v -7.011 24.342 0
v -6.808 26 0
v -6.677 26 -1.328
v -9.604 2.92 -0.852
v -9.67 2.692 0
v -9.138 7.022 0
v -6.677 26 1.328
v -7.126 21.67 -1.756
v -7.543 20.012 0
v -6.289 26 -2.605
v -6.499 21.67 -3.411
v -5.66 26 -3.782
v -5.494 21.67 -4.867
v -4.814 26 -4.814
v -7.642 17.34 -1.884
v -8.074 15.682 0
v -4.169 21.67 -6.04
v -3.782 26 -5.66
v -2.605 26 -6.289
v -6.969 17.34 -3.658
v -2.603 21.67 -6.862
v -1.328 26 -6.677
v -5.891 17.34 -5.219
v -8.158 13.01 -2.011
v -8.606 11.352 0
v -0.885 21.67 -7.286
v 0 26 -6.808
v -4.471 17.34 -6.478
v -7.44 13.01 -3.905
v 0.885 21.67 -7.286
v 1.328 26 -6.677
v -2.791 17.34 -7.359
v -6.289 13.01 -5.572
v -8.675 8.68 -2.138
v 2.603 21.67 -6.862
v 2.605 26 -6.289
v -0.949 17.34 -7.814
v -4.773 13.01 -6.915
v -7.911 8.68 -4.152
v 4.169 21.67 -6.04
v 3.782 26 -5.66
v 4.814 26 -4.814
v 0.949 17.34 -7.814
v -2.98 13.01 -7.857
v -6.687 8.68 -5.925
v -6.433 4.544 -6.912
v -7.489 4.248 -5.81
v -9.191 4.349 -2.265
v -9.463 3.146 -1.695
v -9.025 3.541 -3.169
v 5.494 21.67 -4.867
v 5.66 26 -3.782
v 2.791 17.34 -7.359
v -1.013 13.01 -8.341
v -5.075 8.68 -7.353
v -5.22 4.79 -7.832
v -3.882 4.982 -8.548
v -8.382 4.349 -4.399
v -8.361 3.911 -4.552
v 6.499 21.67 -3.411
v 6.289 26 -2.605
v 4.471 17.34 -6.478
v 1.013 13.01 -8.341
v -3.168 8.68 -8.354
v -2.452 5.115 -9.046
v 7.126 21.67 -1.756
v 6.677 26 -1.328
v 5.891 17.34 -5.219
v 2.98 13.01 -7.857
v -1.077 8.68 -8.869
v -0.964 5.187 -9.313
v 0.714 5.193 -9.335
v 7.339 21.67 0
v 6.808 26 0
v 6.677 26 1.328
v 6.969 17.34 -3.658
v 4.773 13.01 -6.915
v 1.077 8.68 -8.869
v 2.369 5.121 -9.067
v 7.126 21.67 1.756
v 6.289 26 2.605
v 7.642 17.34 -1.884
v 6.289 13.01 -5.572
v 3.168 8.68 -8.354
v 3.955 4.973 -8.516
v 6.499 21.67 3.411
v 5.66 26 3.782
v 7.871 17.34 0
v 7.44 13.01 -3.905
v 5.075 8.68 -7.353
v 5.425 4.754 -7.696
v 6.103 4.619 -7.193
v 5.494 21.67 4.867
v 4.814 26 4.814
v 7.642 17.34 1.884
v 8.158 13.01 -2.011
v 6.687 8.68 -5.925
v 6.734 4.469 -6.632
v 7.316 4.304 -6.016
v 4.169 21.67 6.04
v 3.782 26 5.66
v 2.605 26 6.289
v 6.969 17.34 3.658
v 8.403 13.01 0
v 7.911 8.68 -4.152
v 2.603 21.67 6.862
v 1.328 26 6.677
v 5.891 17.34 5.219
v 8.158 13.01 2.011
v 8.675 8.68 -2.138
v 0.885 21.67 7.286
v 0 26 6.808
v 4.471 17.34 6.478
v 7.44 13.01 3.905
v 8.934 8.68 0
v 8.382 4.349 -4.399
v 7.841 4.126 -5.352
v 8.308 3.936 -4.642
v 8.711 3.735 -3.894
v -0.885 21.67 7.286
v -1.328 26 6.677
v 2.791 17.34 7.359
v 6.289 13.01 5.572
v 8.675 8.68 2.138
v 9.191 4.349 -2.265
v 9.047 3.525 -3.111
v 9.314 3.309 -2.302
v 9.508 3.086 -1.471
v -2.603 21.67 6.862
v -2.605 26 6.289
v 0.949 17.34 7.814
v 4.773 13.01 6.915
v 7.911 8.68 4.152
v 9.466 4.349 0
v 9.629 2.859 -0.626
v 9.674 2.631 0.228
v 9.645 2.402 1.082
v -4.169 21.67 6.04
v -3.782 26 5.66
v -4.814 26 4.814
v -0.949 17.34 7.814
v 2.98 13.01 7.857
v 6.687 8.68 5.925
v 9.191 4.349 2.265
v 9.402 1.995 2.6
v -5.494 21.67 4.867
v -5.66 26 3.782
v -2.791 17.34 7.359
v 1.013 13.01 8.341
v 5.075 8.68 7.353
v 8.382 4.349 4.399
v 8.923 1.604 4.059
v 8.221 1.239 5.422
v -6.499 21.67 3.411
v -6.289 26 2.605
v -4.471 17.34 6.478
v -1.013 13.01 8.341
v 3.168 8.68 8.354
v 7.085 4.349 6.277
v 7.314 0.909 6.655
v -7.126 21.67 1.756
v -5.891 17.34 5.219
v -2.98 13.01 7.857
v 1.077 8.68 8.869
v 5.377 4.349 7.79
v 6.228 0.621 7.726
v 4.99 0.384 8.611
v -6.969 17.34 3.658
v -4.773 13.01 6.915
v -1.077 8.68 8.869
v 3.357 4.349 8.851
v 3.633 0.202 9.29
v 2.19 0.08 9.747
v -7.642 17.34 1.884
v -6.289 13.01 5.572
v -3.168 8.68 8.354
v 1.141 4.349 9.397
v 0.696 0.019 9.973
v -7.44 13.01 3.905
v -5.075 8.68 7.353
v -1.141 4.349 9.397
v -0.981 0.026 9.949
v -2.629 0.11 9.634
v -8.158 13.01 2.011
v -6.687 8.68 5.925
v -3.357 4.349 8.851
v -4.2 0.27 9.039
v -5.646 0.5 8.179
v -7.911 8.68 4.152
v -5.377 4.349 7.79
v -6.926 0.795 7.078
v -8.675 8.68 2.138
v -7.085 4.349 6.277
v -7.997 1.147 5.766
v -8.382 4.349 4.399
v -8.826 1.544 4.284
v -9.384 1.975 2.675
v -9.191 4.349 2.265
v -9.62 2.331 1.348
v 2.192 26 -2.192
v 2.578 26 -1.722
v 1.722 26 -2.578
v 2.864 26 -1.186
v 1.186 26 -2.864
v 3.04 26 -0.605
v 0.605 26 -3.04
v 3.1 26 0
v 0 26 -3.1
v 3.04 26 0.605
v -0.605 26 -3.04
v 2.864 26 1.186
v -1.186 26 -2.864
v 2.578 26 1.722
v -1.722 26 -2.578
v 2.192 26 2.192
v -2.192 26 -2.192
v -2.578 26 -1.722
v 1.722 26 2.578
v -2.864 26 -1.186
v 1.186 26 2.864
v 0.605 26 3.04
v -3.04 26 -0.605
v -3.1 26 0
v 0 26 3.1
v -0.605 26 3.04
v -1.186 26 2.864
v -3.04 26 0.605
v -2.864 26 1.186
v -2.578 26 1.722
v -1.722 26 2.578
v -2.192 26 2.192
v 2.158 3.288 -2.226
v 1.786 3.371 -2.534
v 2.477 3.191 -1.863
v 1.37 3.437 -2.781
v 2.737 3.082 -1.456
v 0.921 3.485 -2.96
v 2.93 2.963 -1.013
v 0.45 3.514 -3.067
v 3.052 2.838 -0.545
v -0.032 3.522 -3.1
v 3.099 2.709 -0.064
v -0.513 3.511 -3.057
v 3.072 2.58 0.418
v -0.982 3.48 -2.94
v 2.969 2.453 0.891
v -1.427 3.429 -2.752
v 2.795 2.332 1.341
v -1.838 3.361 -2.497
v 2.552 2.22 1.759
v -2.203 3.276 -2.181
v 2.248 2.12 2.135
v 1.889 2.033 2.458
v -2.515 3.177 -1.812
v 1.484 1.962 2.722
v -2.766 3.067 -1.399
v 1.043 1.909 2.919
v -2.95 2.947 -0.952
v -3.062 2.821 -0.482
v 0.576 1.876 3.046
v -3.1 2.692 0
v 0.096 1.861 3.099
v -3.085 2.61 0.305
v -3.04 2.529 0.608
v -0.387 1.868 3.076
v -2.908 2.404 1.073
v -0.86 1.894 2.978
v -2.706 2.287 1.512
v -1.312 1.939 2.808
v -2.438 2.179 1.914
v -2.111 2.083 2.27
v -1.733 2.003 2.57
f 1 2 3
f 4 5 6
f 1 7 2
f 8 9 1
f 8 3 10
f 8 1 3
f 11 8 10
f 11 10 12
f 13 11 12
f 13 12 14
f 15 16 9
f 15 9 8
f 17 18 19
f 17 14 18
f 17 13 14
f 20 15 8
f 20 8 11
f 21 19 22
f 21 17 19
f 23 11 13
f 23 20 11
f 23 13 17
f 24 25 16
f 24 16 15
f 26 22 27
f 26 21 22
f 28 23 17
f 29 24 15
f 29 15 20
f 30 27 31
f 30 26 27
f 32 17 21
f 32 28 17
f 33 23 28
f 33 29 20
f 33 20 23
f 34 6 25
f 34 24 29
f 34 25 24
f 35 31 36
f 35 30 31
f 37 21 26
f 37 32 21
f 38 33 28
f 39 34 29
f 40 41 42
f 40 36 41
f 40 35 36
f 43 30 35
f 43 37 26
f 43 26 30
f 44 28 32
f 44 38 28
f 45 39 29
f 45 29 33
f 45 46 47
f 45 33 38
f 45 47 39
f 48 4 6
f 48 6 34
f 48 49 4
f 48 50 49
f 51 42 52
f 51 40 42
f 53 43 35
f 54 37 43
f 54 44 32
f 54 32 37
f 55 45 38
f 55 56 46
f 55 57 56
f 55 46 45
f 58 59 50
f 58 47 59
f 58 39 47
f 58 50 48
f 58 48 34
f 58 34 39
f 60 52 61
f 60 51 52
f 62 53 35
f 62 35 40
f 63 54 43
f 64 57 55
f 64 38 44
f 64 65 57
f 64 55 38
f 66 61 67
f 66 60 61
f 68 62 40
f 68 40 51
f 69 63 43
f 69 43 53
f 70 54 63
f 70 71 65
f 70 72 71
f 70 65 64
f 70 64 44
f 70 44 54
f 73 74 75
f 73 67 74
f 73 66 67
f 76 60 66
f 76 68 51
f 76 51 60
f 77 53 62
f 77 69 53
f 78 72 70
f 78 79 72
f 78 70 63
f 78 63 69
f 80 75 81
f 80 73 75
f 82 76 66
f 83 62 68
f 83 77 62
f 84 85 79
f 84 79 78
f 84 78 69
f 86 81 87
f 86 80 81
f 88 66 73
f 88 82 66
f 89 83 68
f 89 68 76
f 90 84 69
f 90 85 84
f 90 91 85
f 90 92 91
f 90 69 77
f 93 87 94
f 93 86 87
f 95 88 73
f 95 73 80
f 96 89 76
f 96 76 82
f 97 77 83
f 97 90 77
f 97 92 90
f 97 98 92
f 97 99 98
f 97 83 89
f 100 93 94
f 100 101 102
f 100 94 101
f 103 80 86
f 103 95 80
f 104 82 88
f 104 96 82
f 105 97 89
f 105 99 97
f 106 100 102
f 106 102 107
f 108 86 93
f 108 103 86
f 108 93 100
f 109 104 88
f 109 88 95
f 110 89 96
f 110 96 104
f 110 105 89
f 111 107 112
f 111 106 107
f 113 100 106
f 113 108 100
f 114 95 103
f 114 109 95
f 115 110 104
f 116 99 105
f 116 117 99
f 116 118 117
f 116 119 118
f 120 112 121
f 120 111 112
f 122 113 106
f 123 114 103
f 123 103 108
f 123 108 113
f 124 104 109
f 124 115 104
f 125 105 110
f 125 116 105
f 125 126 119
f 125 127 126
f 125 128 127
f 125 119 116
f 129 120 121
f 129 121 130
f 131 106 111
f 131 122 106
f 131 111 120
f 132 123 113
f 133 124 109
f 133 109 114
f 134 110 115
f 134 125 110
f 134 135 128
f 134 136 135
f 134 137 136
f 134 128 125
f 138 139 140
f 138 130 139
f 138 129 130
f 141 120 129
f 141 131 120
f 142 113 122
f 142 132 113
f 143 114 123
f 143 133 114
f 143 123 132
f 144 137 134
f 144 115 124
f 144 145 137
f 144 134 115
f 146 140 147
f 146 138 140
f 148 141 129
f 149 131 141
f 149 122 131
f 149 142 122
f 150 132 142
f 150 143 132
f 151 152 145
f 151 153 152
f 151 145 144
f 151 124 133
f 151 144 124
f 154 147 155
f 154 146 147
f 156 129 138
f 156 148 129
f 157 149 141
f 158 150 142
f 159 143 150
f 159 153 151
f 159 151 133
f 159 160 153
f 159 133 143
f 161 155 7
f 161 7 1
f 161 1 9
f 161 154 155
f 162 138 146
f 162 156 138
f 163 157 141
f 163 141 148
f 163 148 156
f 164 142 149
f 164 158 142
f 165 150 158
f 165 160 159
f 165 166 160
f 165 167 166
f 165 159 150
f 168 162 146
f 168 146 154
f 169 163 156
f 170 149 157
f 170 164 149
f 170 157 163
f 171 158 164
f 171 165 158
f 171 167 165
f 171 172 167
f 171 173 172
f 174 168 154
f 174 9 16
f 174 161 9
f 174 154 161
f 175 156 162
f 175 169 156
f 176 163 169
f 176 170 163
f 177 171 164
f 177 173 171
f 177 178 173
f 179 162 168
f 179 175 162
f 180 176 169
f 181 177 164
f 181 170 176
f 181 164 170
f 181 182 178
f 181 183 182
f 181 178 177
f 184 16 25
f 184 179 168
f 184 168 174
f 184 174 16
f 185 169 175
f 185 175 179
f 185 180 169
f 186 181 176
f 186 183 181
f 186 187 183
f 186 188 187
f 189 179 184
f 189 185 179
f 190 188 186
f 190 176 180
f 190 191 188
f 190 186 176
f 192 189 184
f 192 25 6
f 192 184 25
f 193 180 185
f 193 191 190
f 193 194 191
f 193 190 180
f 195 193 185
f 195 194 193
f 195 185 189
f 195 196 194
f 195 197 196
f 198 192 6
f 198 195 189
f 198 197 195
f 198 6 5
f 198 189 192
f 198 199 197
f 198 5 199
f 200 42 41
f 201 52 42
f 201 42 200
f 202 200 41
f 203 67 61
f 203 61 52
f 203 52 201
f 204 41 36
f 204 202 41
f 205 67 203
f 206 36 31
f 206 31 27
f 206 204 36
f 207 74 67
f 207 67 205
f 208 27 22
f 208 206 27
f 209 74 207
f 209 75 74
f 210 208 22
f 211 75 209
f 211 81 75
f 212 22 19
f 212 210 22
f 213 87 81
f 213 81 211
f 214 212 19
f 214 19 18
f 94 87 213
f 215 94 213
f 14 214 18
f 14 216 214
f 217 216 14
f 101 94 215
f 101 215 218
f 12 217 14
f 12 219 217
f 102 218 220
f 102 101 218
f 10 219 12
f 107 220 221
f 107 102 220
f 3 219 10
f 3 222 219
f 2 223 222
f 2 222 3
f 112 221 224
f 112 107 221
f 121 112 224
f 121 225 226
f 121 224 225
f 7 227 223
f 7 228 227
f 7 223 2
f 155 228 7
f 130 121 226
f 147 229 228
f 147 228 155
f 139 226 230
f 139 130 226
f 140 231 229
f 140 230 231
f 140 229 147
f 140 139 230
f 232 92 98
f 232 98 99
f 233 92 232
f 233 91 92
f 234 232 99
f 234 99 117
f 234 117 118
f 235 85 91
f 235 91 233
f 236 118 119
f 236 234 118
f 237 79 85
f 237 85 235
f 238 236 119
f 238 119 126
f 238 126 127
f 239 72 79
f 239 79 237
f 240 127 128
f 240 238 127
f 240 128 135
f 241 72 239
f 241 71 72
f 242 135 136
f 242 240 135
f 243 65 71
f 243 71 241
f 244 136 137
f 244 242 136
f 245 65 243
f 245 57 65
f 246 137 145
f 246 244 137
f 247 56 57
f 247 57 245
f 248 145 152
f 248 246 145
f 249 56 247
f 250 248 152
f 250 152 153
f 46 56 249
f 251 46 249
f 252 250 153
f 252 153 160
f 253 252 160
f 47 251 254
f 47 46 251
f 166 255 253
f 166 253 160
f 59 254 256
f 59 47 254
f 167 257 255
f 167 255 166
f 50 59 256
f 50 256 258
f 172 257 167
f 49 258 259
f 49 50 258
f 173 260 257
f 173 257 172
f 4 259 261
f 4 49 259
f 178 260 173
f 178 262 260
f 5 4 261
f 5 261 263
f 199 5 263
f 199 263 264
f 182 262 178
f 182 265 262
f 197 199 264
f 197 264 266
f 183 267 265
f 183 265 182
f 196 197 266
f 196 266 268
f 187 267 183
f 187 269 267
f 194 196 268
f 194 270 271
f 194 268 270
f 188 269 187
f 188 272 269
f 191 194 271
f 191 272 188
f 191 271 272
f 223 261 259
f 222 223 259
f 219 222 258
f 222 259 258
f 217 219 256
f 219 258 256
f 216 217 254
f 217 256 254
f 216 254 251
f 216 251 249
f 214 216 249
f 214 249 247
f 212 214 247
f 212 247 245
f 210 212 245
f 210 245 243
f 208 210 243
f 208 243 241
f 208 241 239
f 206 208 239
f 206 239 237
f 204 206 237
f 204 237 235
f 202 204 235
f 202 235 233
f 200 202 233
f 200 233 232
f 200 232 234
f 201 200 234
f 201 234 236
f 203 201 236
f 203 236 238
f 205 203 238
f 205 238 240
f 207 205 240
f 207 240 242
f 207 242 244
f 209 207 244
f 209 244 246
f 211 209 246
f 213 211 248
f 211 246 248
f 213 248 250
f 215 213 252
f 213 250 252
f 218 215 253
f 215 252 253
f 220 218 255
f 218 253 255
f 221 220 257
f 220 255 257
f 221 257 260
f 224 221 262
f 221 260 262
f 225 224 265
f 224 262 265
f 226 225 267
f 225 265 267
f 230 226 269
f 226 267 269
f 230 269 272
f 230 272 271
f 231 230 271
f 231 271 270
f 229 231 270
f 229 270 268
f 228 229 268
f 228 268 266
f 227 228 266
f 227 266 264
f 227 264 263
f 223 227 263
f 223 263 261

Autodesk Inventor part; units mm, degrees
ref_plane "YZ Plane" through (0, 0, 0) normal (1, 0, 0) x (0, 1, 0)
ref_plane "XZ Plane" through (0, 0, 0) normal (0, 1, 0) x (-1, 0, 0)
sketch "Sketch1" plane through (0, 0, 0) normal (0, 1, 0) x (-1, 0, 0)
  circle A0 centre (0, 0) radius 10
  circle A1 centre (0, 0) radius 3.1
  dimension "d0" = 20
  dimension "d1" = 6.2
extrude "Extrusion1" add sketch "Sketch1" along normal blind 26
ref_plane "Work Plane3" through (0, 2.5114, 0.6729) normal (0, -0.9659258, -0.258819) x (1, 0, 0)
ref_plane "Work Plane2" through (0, 0, 0) normal (0, -0.9659258, -0.258819) x (1, 0, 0)
draft "FaceDraft1" angle 7 pull direction (0, 1, 0) faces at (-9.8705, 17.3333, -1.6041) fixed edges at (10, 0, 0)
sketch "Sketch2" plane through (0, 26, 0) normal (0, 1, 0) x (1, 0, 0)
  point P0 (0, 0)
split "Split1" plane through (0, 2.5114, 0.6729) removes the side toward (0, -0.9659258, -0.258819)
ref_plane "Work Plane1" through (0, 0, 0) normal (0, -1, 0) x (1, 0, 0)
properties part number "cone"
